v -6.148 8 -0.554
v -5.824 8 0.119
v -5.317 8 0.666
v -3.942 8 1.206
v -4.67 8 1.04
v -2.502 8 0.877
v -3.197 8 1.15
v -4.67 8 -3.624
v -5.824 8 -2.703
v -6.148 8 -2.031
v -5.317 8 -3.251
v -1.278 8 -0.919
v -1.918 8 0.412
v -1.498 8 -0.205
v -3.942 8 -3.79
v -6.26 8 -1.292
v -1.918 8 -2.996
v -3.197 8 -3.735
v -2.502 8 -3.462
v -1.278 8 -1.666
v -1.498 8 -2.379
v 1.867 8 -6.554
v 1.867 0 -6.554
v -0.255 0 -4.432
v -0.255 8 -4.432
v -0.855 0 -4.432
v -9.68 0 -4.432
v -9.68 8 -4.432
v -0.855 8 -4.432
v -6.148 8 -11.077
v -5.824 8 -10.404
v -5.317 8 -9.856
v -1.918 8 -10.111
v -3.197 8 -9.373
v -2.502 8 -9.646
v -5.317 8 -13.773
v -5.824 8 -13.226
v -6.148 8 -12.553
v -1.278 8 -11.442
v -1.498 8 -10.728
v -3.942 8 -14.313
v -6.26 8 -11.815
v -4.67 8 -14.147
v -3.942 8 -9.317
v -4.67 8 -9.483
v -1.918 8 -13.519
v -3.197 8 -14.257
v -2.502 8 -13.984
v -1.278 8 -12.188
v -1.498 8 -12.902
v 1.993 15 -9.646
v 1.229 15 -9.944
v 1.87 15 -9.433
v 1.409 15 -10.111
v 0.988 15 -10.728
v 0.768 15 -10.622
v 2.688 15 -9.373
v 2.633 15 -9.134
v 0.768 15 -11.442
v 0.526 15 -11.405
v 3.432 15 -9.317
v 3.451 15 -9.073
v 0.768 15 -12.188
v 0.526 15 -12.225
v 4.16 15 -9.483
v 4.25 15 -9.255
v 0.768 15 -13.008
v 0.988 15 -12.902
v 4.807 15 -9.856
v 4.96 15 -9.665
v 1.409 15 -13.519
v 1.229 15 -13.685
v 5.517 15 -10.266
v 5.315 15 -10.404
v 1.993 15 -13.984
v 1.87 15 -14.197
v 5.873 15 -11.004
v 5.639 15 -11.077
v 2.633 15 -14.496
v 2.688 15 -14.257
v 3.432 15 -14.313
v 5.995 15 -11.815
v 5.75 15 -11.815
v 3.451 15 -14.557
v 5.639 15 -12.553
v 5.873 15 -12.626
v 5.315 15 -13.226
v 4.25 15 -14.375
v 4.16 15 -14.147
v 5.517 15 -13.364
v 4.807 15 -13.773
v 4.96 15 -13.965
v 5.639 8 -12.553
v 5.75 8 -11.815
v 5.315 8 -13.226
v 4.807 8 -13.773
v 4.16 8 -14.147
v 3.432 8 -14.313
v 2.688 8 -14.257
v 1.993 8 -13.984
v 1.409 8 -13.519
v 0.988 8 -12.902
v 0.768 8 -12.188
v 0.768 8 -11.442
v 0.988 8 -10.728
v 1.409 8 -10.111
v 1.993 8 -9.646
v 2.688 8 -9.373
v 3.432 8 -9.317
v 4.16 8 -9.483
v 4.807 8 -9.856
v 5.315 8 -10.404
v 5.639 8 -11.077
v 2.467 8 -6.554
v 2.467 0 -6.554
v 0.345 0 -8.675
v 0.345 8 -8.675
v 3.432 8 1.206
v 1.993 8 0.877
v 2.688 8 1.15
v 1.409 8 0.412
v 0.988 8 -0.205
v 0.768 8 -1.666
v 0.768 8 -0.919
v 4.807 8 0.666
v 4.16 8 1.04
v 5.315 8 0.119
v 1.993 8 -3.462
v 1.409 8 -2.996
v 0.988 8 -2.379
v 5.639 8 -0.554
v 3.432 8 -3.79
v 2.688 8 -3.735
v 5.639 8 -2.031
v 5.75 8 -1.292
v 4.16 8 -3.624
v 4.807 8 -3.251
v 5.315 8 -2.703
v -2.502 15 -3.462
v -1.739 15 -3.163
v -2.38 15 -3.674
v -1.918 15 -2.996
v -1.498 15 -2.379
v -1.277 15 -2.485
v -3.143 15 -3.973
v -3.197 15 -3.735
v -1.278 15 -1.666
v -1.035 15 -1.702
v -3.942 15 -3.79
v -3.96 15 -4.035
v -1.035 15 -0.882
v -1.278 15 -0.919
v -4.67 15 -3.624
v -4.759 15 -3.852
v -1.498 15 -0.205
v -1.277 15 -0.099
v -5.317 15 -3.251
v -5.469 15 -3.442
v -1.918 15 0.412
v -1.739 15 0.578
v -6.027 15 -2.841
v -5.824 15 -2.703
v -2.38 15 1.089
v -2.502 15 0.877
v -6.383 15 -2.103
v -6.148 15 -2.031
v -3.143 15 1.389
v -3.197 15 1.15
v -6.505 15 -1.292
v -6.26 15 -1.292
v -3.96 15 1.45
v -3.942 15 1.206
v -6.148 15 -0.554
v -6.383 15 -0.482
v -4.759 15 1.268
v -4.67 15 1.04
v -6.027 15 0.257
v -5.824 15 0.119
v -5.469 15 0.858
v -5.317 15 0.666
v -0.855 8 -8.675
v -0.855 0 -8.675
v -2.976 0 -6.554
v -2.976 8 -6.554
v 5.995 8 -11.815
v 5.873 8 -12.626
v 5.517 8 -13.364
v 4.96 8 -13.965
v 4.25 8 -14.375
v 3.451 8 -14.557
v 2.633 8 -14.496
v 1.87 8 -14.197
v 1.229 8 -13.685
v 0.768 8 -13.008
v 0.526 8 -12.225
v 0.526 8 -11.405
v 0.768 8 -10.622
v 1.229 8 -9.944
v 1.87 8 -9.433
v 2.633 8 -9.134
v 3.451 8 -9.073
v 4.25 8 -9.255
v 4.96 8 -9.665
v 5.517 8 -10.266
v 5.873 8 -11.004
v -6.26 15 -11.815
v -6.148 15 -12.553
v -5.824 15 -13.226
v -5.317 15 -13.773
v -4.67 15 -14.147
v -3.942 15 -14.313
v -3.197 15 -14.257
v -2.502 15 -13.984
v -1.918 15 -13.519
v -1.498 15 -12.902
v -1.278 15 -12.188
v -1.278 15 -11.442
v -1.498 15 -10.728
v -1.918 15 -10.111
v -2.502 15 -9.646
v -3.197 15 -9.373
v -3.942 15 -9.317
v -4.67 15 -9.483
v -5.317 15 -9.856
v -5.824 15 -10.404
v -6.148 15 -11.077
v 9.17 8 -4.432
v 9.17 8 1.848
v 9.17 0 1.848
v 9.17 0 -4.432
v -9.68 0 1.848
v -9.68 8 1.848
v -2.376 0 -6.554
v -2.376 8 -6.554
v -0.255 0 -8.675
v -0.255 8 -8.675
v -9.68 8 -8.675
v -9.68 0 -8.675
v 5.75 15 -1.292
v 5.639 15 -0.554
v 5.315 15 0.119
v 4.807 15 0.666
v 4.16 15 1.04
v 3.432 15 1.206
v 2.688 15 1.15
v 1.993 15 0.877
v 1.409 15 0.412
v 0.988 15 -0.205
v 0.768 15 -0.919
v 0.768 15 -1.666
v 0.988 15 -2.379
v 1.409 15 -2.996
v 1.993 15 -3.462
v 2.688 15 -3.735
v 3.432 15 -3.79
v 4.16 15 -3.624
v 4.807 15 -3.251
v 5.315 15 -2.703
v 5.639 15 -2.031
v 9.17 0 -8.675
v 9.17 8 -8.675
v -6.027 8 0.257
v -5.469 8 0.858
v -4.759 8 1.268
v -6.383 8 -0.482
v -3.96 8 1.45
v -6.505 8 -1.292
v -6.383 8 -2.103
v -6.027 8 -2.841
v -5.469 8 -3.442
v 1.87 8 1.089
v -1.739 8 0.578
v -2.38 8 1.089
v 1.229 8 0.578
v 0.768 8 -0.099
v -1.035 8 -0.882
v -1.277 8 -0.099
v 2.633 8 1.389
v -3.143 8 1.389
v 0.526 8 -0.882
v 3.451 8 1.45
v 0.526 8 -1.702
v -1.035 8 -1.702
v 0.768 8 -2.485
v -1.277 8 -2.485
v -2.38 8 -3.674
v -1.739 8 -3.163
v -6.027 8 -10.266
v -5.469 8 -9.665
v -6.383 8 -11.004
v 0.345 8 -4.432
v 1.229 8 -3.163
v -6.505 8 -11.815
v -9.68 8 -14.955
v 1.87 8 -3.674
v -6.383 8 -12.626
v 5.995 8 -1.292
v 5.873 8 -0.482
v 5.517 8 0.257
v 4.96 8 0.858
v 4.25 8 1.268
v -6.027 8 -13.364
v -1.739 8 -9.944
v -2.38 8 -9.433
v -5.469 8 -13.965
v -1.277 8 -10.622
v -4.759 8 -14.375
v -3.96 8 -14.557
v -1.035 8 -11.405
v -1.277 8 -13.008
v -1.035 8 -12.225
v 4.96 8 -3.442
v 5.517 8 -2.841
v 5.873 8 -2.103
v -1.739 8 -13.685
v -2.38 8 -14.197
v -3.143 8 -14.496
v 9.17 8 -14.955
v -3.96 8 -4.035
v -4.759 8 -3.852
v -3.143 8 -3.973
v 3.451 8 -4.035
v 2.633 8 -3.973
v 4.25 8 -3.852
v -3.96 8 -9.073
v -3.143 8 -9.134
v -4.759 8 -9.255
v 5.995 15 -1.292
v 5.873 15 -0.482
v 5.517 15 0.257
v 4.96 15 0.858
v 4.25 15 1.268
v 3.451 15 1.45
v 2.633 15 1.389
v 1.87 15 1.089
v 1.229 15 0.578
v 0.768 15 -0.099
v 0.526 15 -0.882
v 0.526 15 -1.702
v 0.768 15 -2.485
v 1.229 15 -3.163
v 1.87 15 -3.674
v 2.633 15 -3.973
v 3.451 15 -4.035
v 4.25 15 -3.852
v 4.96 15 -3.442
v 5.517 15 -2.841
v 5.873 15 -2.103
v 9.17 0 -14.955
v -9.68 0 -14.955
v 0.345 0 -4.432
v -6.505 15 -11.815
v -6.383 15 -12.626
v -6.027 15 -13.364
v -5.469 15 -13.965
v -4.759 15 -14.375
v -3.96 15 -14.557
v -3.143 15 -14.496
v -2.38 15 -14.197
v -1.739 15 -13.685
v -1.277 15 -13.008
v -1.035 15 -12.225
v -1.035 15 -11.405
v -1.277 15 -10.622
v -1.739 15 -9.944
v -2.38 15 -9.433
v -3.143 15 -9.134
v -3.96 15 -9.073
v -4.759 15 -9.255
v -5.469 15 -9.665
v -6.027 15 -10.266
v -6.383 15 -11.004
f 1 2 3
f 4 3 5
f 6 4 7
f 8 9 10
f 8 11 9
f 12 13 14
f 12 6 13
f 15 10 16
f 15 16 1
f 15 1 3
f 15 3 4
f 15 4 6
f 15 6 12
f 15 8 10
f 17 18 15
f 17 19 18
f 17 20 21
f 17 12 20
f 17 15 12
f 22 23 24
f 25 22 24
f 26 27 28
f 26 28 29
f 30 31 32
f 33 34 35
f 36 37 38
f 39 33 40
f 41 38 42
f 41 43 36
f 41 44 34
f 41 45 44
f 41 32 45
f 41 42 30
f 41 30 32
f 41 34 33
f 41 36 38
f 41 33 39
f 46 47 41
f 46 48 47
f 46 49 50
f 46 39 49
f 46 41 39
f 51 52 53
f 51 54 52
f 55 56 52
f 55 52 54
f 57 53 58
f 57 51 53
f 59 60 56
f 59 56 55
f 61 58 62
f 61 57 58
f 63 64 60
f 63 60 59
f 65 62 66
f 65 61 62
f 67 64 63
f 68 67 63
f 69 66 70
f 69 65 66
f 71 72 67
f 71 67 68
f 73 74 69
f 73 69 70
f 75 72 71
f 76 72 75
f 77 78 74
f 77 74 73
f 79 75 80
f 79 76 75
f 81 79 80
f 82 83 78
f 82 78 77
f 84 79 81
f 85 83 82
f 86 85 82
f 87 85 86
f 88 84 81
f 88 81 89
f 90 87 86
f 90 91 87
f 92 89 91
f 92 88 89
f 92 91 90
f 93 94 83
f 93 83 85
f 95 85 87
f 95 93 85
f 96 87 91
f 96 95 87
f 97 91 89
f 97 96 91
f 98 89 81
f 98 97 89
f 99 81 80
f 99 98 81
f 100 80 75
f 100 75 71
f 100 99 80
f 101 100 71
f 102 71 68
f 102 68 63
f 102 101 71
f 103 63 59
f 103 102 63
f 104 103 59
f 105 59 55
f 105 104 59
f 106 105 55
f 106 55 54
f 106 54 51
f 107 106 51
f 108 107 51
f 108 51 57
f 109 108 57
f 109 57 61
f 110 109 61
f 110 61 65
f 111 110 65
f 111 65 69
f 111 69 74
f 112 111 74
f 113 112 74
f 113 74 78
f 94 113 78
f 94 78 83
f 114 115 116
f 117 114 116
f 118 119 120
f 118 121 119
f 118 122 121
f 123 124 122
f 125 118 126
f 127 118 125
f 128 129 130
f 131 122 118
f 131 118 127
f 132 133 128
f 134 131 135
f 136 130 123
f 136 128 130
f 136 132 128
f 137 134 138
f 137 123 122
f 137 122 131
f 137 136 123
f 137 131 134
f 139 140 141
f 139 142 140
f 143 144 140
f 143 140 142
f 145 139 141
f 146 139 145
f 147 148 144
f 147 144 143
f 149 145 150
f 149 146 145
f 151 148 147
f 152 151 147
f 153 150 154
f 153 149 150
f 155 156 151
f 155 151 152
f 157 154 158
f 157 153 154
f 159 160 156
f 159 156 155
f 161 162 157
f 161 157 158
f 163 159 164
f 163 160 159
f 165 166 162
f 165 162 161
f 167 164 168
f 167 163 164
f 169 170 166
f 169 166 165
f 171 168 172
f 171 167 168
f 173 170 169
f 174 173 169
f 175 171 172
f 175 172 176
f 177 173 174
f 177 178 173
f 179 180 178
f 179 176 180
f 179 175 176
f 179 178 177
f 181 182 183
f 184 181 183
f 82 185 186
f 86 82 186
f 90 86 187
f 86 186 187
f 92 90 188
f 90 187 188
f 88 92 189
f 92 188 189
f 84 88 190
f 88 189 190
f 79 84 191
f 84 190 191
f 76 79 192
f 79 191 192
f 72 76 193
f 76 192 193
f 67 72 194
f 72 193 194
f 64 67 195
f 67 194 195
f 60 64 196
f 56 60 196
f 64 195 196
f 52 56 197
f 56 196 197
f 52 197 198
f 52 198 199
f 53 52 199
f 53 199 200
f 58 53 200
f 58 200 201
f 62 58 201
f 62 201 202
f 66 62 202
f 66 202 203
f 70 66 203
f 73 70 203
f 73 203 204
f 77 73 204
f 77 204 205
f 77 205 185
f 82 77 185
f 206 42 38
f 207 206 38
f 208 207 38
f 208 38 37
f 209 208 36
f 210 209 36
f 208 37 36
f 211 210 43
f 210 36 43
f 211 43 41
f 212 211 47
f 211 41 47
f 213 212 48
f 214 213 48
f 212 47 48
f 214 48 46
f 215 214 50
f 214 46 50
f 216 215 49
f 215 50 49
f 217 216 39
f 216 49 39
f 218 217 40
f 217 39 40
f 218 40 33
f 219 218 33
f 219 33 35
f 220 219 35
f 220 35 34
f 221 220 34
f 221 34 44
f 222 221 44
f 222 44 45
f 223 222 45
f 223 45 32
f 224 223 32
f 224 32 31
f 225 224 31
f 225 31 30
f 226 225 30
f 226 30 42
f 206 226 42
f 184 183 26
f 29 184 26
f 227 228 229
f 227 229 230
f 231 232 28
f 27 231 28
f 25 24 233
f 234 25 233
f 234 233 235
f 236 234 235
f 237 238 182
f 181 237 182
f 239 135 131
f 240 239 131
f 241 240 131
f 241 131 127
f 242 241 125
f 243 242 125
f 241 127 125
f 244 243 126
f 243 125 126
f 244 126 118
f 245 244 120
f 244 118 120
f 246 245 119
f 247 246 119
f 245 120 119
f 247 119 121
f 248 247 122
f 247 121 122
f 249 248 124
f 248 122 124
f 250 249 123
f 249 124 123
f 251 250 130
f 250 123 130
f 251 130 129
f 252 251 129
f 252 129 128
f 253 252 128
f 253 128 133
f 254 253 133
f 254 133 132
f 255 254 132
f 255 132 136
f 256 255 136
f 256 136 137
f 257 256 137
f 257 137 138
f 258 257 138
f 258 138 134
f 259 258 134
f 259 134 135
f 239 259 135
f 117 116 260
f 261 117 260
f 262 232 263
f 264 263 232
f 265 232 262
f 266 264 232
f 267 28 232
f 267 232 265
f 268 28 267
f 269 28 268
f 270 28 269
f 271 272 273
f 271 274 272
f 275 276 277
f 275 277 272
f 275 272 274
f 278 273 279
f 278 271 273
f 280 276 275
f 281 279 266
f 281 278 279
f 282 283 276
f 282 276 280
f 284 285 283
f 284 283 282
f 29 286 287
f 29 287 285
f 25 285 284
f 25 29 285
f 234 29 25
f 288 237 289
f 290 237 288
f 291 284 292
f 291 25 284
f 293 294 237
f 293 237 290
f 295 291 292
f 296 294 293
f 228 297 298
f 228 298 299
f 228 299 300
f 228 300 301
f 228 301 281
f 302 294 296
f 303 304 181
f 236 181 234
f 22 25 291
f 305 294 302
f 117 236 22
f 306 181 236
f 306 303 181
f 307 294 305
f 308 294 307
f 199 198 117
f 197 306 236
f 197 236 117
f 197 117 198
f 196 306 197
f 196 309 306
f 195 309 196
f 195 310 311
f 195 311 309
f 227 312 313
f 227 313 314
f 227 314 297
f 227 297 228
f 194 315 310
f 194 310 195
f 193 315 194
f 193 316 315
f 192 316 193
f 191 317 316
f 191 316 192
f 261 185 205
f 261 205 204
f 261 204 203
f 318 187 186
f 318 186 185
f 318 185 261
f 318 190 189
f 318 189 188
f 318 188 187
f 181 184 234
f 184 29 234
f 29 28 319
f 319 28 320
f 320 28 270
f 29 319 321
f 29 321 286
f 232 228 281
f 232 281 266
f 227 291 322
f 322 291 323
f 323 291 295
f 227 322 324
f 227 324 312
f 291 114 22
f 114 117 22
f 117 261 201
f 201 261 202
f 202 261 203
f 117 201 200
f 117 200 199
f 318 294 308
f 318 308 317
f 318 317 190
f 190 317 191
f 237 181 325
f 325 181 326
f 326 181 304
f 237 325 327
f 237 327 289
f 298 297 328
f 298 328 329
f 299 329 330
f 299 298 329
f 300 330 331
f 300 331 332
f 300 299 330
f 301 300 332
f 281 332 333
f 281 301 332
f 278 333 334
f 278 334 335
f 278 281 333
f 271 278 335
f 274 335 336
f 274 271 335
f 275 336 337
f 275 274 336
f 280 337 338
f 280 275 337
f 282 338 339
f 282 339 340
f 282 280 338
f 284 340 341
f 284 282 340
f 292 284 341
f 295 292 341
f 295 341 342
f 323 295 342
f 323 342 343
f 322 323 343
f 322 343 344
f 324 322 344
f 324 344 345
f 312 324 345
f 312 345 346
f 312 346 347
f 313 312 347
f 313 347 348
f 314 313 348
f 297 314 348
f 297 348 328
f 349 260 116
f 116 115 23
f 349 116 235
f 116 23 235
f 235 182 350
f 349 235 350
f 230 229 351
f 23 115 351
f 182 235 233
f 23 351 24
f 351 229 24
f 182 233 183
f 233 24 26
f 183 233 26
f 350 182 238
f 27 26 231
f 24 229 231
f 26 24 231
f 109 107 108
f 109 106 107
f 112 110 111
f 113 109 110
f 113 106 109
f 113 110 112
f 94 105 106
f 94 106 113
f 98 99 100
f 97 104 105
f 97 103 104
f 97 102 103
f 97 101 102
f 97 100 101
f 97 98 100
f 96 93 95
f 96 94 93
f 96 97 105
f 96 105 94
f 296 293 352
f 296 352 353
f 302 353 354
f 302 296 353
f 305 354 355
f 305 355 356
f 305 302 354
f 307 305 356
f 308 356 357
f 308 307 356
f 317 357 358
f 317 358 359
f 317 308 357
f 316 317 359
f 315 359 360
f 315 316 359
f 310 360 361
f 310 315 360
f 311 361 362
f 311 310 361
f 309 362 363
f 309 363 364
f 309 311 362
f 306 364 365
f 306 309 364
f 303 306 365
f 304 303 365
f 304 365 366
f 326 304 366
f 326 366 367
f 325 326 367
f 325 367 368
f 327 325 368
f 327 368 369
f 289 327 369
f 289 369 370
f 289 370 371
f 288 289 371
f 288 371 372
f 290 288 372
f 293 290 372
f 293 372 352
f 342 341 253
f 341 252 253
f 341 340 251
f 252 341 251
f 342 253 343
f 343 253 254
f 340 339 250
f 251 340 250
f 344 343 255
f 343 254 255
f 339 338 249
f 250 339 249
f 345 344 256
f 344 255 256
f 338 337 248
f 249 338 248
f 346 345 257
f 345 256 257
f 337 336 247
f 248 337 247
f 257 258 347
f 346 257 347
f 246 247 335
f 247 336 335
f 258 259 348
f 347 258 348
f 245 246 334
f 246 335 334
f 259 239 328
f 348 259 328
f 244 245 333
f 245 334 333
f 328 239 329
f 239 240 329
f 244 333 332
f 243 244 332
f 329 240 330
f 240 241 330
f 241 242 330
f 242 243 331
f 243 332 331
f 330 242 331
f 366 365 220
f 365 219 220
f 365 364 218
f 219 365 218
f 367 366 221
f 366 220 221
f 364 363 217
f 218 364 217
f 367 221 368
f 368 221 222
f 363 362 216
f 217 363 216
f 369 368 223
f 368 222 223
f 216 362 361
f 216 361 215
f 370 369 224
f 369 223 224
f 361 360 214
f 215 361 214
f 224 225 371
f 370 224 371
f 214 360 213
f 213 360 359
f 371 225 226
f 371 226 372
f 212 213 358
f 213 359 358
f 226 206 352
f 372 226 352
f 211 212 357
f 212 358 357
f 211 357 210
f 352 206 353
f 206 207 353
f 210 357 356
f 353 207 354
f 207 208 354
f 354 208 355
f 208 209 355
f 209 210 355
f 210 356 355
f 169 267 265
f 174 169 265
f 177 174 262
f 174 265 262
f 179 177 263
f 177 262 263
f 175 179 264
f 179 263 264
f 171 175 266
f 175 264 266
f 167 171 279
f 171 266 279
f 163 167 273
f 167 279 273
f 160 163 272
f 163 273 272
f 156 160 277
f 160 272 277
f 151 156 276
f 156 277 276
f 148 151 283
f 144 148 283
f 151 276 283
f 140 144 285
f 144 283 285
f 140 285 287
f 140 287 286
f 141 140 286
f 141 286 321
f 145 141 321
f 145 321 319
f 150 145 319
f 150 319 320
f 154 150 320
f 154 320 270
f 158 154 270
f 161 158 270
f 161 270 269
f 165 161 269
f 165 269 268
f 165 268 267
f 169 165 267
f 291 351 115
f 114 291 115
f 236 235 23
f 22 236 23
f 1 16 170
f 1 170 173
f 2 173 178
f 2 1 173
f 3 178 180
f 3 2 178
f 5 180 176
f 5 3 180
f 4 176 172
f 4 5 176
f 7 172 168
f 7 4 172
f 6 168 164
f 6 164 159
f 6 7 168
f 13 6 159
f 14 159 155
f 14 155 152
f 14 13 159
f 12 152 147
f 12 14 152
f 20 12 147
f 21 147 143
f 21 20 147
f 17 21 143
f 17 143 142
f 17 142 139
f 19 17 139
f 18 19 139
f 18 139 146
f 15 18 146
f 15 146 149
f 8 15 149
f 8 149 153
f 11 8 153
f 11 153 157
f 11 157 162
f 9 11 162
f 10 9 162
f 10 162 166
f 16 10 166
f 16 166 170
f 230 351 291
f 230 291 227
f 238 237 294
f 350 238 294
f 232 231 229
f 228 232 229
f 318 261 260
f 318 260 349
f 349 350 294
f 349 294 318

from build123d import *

# Parameters (mm, degrees)
SKETCH1_W                 = 18.85
SKETCH1_H                 = 6.28
BOSS_EXTRUDE1_DEPTH       = 8
BOSS_EXTRUDE2_DEPTH       = 8
BOSS_EXTRUDE3_DEPTH       = 8
SKETCH2_R                 = 2.75
SKETCH2_R_2               = 2.505012867
BOSS_EXTRUDE5_DEPTH       = 15
MIRROR2_COPY_1_SKETCH_R   = 2.75
MIRROR2_COPY_1_SKETCH_R_2 = 2.505012867
MIRROR2_COPY_1_DEPTH      = 15


with BuildPart() as part:
    # Sketch1 → Boss-Extrude1 (new body)
    with BuildSketch(Plane(origin=(0, 0, 0), x_dir=(1, 0, 0), z_dir=(0, 1, 0))):
        with Locations((-0.25472973, 1.292297297)):
            Rectangle(SKETCH1_W, SKETCH1_H)
    extrude(amount=BOSS_EXTRUDE1_DEPTH)



with BuildPart() as body_2:
    # Sketch1<3> → Boss-Extrude2 (new body)
    with BuildSketch(Plane(origin=(0, 0, 0), x_dir=(1, 0, 0), z_dir=(0, 1, 0))):
        Polygon((-0.85472973, 8.674937984), (-0.25472973, 8.674937984), (0.34527027, 8.674937984), (9.17027027, 8.674937984), (9.17027027, 14.954937984), (-9.67972973, 14.954937984), (-9.67972973, 8.674937984), align=None)
    extrude(amount=BOSS_EXTRUDE2_DEPTH)


with BuildPart() as part_1:
    add(part.part)

    add(body_2.part)  # Boss-Extrude3 merges body 2
    # Sketch1<5> → Boss-Extrude3 (add)
    with BuildSketch(Plane(origin=(0, 0, 0), x_dir=(1, 0, 0), z_dir=(0, 1, 0))):
        Polygon((1.866590614, 6.553617641), (-0.25472973, 4.432297297), (0.34527027, 4.432297297), (2.466590614, 6.553617641), (0.34527027, 8.674937984), (-0.25472973, 8.674937984), align=None)
        Polygon((-0.85472973, 4.432297297), (-0.25472973, 4.432297297), (-2.376050073, 6.553617641), (-0.25472973, 8.674937984), (-0.85472973, 8.674937984), (-2.976050073, 6.553617641), align=None)
    extrude(amount=BOSS_EXTRUDE3_DEPTH)

    # Sketch2 → Boss-Extrude5 (add)
    with BuildSketch(Plane(origin=(0, 0, 0), x_dir=(1, 0, 0), z_dir=(0, 1, 0))):
        with Locations((3.24527027, 11.814937984)):
            Circle(SKETCH2_R)
        with Locations((3.24527027, 11.814937984)):
            Circle(SKETCH2_R_2, mode=Mode.SUBTRACT)
    boss_extrude5 = extrude(amount=BOSS_EXTRUDE5_DEPTH)

    # Mirror1: Boss-Extrude5 across plane
    add(boss_extrude5.mirror(Plane(origin=(-0.25472973, 0, 0), x_dir=(0, 0, 1), z_dir=(1, 0, 0))))

    # Mirror2: Boss-Extrude5 across plane
    add(boss_extrude5.mirror(Plane(origin=(0, 0, -6.553617641), x_dir=(1, 0, 0), z_dir=(0, 0, -1))))

    # Mirror2 copy 1 sketch → Mirror2 copy 1 (add)
    with BuildSketch(Plane(origin=(-0.509459459, 0, -13.107235282), x_dir=(-1, 0, 0), z_dir=(0, 1, 0))):
        with Locations((3.24527027, 11.814937984)):
            Circle(MIRROR2_COPY_1_SKETCH_R)
        with Locations((3.24527027, 11.814937984)):
            Circle(MIRROR2_COPY_1_SKETCH_R_2, mode=Mode.SUBTRACT)
    extrude(amount=MIRROR2_COPY_1_DEPTH)


solid = part_1.part
